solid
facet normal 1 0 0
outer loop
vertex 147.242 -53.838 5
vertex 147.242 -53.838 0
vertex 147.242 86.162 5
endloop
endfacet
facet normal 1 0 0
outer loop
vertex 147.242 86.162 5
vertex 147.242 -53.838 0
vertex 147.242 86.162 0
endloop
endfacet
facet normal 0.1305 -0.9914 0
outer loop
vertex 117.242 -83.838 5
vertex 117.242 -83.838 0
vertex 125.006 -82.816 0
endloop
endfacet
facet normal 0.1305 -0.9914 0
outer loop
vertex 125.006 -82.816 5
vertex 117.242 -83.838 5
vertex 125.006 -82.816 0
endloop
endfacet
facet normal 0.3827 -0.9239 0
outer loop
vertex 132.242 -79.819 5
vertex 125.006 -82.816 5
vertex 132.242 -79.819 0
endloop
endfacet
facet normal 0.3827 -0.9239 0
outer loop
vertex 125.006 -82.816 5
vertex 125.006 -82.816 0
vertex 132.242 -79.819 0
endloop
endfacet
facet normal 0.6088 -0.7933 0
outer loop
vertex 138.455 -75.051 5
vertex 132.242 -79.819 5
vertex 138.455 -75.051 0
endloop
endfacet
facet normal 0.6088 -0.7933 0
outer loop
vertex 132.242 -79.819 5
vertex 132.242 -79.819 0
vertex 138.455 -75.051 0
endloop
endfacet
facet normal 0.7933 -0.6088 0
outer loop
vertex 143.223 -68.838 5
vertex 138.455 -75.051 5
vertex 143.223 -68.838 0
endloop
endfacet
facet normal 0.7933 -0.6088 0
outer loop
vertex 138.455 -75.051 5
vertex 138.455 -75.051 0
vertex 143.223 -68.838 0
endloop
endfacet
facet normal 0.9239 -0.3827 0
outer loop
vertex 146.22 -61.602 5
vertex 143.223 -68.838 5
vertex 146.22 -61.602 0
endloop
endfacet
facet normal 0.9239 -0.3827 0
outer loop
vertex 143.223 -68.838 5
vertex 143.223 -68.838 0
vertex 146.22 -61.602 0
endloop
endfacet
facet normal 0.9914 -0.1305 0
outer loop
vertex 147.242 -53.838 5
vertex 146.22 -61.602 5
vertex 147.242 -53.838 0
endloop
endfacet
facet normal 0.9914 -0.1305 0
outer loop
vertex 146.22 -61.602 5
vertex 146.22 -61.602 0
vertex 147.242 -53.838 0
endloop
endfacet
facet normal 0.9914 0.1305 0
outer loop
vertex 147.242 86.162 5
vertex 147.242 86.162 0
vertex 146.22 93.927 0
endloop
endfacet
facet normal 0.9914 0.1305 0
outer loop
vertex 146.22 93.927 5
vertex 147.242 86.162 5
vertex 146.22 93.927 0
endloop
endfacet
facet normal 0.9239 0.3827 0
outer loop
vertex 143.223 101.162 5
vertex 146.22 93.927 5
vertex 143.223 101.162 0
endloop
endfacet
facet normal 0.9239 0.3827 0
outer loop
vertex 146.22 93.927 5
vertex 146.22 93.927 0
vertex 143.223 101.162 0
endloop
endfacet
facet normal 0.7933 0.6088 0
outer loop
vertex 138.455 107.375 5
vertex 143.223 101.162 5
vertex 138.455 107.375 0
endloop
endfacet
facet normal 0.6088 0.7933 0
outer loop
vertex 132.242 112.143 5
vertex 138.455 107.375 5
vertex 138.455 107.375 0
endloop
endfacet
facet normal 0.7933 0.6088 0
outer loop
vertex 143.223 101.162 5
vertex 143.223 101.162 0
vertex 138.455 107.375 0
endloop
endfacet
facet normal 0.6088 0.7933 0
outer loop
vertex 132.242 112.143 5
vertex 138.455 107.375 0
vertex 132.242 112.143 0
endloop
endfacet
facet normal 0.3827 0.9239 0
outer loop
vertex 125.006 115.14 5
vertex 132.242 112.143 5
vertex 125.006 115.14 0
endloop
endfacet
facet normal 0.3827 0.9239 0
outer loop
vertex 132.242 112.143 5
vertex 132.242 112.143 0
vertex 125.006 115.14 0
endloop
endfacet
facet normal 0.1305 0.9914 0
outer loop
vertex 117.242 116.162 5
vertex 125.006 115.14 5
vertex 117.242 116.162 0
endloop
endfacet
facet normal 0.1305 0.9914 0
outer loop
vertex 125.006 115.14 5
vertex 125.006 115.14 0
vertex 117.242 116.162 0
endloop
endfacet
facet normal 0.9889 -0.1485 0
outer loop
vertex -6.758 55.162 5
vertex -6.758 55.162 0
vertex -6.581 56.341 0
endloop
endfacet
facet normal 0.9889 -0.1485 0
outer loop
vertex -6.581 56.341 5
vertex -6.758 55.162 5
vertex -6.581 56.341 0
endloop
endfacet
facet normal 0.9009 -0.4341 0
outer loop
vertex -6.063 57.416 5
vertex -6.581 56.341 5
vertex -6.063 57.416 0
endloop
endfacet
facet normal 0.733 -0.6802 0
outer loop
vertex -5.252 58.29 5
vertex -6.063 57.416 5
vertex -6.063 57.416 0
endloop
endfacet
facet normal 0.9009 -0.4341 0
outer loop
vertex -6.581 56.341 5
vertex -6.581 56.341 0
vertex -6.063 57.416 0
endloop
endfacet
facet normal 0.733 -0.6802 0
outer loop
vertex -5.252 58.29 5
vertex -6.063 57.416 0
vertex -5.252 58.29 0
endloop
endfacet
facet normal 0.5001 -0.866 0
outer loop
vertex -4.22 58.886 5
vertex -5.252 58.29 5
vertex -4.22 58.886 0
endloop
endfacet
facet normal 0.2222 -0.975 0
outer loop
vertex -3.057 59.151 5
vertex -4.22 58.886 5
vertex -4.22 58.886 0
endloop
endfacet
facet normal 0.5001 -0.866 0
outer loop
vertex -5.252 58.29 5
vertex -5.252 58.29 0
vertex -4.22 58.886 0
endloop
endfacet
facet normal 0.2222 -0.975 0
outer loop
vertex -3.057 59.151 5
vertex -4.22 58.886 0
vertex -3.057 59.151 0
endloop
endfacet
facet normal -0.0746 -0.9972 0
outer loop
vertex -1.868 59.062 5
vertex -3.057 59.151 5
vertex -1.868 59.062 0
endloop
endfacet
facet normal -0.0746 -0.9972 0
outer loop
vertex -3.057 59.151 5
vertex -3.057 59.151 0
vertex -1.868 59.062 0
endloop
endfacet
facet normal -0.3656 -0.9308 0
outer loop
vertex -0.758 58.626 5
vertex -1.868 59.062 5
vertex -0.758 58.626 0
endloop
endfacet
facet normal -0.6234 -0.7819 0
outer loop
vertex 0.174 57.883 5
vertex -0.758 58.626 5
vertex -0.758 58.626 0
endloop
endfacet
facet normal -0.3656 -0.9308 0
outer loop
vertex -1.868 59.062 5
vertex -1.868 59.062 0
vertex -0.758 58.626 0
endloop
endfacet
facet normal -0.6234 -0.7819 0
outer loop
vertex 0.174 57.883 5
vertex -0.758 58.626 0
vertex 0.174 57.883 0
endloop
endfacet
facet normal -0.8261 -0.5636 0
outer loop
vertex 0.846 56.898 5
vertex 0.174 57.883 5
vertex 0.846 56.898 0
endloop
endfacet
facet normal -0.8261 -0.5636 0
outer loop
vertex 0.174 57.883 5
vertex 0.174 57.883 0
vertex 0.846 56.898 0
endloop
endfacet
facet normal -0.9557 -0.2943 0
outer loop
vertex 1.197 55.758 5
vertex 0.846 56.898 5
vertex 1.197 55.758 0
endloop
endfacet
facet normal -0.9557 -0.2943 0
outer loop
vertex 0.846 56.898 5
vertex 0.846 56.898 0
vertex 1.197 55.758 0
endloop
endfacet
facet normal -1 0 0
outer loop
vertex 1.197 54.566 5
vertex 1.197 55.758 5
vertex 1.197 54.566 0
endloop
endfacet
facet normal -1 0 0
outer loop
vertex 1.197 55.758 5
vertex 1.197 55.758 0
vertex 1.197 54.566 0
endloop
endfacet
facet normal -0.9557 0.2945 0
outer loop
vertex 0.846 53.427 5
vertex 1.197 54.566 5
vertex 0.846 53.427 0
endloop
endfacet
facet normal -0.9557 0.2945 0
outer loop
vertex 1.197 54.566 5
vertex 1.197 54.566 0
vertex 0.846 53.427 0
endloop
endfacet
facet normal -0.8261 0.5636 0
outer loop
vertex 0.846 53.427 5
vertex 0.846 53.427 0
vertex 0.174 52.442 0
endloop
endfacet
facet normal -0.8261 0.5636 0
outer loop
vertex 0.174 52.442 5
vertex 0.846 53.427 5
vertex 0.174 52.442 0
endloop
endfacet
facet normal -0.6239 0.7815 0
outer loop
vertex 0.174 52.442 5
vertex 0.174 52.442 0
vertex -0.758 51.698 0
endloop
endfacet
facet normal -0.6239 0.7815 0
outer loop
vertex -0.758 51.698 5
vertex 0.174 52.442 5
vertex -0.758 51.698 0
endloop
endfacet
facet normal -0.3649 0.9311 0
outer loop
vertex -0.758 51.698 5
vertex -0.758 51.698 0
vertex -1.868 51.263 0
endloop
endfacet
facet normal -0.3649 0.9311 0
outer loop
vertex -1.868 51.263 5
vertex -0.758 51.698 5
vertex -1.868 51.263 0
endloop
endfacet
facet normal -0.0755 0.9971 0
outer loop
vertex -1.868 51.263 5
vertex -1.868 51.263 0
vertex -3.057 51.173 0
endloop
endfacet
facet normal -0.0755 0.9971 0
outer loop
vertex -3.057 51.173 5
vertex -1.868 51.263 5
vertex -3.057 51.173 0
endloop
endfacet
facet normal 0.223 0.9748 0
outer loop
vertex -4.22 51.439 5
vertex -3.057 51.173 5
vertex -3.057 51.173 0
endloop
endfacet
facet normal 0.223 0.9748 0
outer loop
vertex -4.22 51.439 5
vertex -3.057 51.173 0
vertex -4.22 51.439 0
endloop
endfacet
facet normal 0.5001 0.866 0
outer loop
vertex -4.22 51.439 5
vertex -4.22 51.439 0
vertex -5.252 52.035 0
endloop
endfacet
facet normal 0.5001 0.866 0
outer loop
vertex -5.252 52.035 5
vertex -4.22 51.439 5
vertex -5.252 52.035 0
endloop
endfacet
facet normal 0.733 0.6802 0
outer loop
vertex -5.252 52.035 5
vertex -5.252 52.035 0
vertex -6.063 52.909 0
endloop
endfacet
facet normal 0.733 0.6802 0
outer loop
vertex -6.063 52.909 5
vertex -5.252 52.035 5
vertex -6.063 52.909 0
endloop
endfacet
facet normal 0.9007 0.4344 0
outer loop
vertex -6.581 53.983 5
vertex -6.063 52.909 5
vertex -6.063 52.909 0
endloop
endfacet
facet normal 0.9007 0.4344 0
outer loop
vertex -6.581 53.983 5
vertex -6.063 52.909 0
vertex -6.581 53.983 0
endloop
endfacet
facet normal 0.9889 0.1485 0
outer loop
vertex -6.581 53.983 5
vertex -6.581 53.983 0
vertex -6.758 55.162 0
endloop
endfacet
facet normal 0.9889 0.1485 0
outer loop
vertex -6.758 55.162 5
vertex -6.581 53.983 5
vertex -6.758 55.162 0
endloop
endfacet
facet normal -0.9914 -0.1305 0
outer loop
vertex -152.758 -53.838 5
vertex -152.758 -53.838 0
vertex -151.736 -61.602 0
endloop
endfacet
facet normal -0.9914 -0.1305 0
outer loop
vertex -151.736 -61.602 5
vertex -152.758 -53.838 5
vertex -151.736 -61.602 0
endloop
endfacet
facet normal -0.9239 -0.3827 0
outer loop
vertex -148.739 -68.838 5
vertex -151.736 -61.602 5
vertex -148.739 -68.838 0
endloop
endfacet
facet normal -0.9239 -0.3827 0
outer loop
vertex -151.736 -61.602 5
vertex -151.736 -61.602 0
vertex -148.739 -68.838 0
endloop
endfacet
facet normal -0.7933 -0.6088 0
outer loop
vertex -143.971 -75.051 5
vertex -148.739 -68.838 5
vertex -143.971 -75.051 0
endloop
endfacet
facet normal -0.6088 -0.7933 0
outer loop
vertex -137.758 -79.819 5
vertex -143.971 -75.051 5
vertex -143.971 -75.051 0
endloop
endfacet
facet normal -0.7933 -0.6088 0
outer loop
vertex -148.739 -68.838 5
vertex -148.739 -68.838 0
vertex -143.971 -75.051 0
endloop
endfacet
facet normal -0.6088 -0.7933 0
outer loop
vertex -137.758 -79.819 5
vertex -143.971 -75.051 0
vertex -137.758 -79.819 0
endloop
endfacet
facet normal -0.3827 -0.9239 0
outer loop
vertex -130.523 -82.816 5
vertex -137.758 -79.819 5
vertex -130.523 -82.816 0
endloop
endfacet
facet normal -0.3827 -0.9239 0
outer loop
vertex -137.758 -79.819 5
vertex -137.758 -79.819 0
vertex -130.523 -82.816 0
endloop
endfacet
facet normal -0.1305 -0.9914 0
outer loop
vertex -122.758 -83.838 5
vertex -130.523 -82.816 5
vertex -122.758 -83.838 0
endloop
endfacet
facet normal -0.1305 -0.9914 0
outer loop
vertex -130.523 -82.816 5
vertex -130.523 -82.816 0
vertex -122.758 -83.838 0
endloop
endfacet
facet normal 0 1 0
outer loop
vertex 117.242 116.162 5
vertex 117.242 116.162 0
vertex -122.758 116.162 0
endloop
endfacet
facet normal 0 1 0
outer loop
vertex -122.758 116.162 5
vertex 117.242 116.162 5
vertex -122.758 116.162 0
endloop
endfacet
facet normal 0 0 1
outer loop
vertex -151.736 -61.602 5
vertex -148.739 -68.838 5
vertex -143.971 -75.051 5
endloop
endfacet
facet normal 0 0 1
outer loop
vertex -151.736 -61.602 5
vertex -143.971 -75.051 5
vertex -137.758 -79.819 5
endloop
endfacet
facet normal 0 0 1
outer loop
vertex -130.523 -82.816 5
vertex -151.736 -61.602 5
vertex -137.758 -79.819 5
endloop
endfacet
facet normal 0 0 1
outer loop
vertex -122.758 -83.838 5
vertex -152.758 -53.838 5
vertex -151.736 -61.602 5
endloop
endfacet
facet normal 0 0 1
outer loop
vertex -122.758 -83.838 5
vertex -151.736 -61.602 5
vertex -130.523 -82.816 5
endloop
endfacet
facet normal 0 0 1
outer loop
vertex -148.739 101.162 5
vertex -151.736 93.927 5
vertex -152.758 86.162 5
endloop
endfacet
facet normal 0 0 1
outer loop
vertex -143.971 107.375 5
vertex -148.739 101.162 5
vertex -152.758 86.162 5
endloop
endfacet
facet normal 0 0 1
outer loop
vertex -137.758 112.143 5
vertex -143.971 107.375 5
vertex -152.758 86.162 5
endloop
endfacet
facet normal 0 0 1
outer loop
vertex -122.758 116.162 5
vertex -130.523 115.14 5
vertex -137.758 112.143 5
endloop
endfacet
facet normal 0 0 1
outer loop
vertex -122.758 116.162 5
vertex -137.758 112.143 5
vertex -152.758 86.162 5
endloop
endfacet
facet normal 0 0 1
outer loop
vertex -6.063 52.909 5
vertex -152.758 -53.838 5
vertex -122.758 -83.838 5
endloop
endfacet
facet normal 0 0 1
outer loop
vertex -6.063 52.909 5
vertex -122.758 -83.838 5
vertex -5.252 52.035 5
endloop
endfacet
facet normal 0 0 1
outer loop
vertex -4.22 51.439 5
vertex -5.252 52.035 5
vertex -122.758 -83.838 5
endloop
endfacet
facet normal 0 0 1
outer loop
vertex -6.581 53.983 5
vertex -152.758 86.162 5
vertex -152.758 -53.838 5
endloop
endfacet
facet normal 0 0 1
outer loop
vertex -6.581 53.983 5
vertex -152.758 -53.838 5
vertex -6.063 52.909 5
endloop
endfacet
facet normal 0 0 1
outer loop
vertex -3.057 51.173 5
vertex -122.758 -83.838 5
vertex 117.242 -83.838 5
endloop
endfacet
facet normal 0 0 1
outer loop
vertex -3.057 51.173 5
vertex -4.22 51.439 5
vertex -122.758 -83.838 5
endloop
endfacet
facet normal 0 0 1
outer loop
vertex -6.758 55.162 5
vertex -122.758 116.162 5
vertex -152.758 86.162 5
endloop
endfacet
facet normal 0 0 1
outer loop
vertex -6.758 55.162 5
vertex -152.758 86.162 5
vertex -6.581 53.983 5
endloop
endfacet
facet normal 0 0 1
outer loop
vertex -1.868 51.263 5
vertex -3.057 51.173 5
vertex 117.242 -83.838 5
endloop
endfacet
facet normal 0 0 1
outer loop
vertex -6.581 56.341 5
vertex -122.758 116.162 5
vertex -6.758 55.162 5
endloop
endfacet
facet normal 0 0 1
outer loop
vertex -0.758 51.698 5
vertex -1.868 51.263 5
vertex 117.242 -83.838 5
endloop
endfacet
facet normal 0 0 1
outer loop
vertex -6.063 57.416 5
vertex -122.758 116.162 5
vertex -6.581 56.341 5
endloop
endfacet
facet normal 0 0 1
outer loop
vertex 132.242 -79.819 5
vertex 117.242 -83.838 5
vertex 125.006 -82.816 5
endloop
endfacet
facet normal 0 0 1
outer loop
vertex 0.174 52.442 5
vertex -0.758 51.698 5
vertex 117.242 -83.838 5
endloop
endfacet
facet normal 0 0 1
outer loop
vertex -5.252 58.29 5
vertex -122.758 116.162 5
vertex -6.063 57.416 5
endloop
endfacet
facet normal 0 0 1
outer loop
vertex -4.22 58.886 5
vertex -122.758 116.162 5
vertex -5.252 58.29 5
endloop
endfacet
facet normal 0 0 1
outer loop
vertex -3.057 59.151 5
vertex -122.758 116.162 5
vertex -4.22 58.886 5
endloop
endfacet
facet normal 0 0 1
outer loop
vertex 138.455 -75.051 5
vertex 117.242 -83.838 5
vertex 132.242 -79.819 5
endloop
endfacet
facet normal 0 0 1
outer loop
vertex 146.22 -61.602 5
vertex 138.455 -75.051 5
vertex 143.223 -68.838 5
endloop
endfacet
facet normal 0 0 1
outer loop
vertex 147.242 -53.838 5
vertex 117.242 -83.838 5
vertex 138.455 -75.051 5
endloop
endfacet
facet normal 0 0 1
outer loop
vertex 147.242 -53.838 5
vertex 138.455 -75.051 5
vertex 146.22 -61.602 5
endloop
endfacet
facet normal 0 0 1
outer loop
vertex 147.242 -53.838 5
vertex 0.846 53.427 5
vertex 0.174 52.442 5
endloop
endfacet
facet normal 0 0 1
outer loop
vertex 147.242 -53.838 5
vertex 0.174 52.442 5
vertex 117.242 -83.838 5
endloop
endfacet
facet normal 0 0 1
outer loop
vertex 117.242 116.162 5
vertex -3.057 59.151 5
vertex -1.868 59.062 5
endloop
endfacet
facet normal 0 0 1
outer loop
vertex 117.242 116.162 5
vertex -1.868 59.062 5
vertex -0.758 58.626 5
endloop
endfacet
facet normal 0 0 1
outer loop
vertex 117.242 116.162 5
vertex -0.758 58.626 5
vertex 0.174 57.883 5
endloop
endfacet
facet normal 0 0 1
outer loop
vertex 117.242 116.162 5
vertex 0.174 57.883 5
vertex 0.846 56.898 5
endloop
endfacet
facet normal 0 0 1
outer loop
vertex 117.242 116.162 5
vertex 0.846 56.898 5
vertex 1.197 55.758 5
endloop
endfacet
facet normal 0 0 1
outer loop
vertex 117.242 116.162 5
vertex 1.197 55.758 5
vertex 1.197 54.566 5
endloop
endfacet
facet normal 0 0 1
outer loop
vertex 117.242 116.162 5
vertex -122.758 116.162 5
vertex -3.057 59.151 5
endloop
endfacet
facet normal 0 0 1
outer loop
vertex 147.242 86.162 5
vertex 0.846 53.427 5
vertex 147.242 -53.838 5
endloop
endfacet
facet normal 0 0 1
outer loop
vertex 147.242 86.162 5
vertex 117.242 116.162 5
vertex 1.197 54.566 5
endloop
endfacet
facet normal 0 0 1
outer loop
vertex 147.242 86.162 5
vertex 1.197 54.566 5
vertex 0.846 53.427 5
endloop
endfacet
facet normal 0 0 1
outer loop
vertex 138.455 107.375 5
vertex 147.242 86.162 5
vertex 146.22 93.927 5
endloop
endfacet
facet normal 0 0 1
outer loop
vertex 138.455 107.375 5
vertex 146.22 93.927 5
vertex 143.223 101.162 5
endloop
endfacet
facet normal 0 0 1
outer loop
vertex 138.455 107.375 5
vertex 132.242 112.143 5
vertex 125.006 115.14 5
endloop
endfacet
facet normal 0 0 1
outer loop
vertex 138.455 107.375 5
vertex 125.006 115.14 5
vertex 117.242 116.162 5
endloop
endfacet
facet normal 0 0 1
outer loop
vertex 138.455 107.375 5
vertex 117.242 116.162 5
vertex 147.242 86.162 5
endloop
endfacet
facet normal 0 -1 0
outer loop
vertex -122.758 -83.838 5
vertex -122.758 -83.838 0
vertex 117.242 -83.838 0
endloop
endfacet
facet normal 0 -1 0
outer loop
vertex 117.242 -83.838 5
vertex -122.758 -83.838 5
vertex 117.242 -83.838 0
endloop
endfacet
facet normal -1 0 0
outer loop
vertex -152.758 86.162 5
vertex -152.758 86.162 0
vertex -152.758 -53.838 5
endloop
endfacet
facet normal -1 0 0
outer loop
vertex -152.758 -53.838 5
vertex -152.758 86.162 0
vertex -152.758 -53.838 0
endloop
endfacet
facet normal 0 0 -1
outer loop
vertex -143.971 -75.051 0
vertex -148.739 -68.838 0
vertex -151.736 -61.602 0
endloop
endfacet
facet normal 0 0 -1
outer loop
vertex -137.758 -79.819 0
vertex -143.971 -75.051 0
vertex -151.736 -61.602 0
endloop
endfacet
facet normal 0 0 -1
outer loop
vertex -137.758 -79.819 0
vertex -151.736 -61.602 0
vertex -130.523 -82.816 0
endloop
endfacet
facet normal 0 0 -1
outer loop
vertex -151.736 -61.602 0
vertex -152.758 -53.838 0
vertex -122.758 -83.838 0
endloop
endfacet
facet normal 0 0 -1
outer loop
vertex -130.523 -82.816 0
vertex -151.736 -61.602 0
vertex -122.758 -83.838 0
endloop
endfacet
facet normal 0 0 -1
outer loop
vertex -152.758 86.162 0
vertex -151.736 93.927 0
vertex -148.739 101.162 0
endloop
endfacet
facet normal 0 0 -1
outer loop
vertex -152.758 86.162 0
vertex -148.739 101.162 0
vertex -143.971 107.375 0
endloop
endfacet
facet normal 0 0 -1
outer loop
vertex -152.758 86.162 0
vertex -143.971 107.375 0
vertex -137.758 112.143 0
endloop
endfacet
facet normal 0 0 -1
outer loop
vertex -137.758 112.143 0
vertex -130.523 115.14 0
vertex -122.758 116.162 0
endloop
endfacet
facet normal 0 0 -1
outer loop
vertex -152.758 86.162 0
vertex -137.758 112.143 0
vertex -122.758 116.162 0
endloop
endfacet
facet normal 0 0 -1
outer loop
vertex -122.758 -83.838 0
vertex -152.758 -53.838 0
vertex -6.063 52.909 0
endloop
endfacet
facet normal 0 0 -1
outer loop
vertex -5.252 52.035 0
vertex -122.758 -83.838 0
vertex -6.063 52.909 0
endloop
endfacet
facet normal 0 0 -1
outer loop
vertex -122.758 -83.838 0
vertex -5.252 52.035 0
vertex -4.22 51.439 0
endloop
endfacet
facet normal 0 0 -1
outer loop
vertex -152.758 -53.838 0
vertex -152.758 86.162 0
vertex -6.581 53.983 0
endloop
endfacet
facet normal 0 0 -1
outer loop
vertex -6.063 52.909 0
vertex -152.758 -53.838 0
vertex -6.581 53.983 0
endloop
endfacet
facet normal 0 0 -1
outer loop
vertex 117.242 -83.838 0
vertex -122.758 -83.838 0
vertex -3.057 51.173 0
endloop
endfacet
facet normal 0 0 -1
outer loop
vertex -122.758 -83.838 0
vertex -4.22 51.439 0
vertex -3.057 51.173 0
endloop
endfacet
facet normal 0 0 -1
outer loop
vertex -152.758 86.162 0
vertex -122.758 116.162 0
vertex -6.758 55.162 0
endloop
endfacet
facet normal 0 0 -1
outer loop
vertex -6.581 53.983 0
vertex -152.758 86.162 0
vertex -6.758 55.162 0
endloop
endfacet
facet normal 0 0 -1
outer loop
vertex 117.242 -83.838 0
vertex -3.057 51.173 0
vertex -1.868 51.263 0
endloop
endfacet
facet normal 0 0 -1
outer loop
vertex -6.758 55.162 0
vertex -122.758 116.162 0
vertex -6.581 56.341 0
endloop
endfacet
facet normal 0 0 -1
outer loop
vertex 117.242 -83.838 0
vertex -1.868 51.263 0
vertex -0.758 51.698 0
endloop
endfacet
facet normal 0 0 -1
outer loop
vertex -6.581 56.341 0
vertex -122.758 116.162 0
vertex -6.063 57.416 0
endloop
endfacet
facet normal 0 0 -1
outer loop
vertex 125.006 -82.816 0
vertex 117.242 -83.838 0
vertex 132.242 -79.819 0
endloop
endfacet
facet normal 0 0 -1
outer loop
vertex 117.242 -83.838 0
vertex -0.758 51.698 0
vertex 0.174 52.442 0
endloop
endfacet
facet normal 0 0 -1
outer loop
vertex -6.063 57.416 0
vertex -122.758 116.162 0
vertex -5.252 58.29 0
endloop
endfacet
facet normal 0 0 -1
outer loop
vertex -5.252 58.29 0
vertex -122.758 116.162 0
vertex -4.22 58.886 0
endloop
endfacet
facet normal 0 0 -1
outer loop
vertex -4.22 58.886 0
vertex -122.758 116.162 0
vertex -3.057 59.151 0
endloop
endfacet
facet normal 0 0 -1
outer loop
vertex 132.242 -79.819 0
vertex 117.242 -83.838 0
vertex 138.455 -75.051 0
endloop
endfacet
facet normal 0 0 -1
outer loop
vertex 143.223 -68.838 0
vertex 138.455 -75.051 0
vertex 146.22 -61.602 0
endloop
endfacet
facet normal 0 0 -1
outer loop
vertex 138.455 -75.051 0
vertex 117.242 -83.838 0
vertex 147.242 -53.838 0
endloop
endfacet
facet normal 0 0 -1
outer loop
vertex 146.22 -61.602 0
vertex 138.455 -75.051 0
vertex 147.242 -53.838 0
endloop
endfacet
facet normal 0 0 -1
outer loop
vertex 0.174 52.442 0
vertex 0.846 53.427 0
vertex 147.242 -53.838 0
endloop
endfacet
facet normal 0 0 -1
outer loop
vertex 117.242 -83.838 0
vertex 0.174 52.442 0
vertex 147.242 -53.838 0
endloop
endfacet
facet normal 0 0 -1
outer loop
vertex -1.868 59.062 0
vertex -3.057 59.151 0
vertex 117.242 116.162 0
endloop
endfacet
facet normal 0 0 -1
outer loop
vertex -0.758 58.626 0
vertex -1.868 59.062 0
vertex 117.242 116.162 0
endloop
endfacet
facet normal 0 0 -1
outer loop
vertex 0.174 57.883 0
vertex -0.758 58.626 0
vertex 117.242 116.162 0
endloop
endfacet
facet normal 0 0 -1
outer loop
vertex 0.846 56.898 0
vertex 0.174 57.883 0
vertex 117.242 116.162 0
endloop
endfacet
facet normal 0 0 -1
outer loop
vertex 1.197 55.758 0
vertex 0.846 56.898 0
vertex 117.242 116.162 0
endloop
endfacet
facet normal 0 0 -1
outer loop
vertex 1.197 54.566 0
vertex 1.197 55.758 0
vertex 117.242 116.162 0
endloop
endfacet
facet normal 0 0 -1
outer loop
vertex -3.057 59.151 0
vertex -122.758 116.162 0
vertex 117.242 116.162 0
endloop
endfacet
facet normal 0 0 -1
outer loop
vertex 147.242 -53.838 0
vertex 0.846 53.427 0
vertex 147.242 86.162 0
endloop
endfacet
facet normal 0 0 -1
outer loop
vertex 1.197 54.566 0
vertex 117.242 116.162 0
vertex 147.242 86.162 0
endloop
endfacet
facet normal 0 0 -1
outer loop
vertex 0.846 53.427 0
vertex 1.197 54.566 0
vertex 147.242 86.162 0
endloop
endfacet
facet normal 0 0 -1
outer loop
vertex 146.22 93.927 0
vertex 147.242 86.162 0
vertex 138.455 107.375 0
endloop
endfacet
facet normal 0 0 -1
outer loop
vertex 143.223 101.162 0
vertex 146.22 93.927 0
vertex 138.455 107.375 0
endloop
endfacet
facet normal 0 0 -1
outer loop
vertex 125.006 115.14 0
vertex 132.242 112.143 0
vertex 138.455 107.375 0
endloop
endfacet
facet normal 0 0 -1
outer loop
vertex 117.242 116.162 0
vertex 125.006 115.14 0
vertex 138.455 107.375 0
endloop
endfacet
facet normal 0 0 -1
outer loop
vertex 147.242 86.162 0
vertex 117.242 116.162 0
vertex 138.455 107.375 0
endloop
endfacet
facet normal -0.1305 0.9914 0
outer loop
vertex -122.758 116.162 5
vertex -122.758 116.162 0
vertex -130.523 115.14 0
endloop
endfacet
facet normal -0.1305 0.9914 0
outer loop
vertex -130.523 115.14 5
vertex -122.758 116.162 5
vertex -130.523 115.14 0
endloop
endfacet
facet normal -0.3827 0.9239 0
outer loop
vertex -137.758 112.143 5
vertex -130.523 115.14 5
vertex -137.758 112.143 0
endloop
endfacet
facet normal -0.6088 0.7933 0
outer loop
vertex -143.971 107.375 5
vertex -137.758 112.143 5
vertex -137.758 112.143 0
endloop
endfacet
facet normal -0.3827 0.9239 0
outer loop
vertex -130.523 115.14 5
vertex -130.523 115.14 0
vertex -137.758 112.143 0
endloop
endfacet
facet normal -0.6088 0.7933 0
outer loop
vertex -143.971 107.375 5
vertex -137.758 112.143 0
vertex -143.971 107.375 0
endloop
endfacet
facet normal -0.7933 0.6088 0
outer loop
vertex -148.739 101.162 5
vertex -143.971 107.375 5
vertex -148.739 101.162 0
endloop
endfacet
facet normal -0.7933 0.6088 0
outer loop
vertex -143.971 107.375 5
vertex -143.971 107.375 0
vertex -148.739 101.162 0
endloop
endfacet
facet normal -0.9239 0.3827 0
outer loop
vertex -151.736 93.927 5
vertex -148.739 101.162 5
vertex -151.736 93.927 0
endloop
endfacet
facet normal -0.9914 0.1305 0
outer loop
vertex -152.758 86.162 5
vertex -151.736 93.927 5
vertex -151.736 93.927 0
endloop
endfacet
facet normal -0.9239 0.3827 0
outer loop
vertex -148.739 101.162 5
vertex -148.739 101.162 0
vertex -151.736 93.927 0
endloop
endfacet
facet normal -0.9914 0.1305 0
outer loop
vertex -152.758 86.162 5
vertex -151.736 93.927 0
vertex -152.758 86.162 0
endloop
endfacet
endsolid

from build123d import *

# Parameters (mm, degrees)
CROQUIS1_R              = 4.05
CROQUIS1_R_2            = 10
CROQUIS1_R_3            = 2
SALIENTE_EXTRUIR1_DEPTH = 5
CROQUIS4_R              = 4
CORTAR_EXTRUIR2_DEPTH   = 10


with BuildPart() as part:
    # Croquis1 → Saliente-Extruir1 (new body)
    with BuildSketch(Plane.XY):
        with BuildLine():
            Line((-152.758258368, 86.1622498), (-152.758258368, -53.8377502))
            ThreePointArc((-152.758258368, -53.8377502), (-143.971461803, -75.050953636), (-122.758258368, -83.8377502))
            Line((-122.758258368, -83.8377502), (117.241741632, -83.8377502))
            ThreePointArc((117.241741632, -83.8377502), (138.454945068, -75.050953636), (147.241741632, -53.8377502))
            Line((147.241741632, -53.8377502), (147.241741632, 86.1622498))
            ThreePointArc((147.241741632, 86.1622498), (138.454945068, 107.375453235), (117.241741632, 116.1622498))
            Line((117.241741632, 116.1622498), (-122.758258368, 116.1622498))
            ThreePointArc((-122.758258368, 116.1622498), (-143.971461803, 107.375453235), (-152.758258368, 86.1622498))
        make_face()
        with Locations((80.390042053, 52.003668375)):
            Circle(CROQUIS1_R, mode=Mode.SUBTRACT)
        with Locations((14.450042053, 52.003668375)):
            Circle(CROQUIS1_R_2, mode=Mode.SUBTRACT)
        with Locations((-1.609957947, 104.003668375)):
            Circle(CROQUIS1_R_3, mode=Mode.SUBTRACT)
        with Locations((102.390042053, 104.003668375)):
            Circle(CROQUIS1_R_3, mode=Mode.SUBTRACT)
        with Locations((52.390042053, 0.003668375)):
            Circle(CROQUIS1_R_3, mode=Mode.SUBTRACT)
        with Locations((-1.609957947, 0.003668375)):
            Circle(CROQUIS1_R_3, mode=Mode.SUBTRACT)
        with Locations((-1.609957947, 104.003668375)):
            Circle(CROQUIS1_R_3)
        with Locations((102.390042053, 104.003668375)):
            Circle(CROQUIS1_R_3)
        with Locations((52.390042053, 0.003668375)):
            Circle(CROQUIS1_R_3)
        with Locations((-1.609957947, 0.003668375)):
            Circle(CROQUIS1_R_3)
        with Locations((14.450042053, 52.003668375)):
            Circle(CROQUIS1_R_2)
        with Locations((80.390042053, 52.003668375)):
            Circle(CROQUIS1_R)
    extrude(amount=SALIENTE_EXTRUIR1_DEPTH)

    # Croquis4 → Cortar-Extruir2 (cut)
    with BuildSketch(Plane(origin=(0, 0, 0), x_dir=(-1, 0, 0), z_dir=(0, 0, -1))):
        with Locations((2.758258368, 55.1622498)):
            Circle(CROQUIS4_R)
    extrude(amount=-CORTAR_EXTRUIR2_DEPTH, mode=Mode.SUBTRACT)


solid = part.part
